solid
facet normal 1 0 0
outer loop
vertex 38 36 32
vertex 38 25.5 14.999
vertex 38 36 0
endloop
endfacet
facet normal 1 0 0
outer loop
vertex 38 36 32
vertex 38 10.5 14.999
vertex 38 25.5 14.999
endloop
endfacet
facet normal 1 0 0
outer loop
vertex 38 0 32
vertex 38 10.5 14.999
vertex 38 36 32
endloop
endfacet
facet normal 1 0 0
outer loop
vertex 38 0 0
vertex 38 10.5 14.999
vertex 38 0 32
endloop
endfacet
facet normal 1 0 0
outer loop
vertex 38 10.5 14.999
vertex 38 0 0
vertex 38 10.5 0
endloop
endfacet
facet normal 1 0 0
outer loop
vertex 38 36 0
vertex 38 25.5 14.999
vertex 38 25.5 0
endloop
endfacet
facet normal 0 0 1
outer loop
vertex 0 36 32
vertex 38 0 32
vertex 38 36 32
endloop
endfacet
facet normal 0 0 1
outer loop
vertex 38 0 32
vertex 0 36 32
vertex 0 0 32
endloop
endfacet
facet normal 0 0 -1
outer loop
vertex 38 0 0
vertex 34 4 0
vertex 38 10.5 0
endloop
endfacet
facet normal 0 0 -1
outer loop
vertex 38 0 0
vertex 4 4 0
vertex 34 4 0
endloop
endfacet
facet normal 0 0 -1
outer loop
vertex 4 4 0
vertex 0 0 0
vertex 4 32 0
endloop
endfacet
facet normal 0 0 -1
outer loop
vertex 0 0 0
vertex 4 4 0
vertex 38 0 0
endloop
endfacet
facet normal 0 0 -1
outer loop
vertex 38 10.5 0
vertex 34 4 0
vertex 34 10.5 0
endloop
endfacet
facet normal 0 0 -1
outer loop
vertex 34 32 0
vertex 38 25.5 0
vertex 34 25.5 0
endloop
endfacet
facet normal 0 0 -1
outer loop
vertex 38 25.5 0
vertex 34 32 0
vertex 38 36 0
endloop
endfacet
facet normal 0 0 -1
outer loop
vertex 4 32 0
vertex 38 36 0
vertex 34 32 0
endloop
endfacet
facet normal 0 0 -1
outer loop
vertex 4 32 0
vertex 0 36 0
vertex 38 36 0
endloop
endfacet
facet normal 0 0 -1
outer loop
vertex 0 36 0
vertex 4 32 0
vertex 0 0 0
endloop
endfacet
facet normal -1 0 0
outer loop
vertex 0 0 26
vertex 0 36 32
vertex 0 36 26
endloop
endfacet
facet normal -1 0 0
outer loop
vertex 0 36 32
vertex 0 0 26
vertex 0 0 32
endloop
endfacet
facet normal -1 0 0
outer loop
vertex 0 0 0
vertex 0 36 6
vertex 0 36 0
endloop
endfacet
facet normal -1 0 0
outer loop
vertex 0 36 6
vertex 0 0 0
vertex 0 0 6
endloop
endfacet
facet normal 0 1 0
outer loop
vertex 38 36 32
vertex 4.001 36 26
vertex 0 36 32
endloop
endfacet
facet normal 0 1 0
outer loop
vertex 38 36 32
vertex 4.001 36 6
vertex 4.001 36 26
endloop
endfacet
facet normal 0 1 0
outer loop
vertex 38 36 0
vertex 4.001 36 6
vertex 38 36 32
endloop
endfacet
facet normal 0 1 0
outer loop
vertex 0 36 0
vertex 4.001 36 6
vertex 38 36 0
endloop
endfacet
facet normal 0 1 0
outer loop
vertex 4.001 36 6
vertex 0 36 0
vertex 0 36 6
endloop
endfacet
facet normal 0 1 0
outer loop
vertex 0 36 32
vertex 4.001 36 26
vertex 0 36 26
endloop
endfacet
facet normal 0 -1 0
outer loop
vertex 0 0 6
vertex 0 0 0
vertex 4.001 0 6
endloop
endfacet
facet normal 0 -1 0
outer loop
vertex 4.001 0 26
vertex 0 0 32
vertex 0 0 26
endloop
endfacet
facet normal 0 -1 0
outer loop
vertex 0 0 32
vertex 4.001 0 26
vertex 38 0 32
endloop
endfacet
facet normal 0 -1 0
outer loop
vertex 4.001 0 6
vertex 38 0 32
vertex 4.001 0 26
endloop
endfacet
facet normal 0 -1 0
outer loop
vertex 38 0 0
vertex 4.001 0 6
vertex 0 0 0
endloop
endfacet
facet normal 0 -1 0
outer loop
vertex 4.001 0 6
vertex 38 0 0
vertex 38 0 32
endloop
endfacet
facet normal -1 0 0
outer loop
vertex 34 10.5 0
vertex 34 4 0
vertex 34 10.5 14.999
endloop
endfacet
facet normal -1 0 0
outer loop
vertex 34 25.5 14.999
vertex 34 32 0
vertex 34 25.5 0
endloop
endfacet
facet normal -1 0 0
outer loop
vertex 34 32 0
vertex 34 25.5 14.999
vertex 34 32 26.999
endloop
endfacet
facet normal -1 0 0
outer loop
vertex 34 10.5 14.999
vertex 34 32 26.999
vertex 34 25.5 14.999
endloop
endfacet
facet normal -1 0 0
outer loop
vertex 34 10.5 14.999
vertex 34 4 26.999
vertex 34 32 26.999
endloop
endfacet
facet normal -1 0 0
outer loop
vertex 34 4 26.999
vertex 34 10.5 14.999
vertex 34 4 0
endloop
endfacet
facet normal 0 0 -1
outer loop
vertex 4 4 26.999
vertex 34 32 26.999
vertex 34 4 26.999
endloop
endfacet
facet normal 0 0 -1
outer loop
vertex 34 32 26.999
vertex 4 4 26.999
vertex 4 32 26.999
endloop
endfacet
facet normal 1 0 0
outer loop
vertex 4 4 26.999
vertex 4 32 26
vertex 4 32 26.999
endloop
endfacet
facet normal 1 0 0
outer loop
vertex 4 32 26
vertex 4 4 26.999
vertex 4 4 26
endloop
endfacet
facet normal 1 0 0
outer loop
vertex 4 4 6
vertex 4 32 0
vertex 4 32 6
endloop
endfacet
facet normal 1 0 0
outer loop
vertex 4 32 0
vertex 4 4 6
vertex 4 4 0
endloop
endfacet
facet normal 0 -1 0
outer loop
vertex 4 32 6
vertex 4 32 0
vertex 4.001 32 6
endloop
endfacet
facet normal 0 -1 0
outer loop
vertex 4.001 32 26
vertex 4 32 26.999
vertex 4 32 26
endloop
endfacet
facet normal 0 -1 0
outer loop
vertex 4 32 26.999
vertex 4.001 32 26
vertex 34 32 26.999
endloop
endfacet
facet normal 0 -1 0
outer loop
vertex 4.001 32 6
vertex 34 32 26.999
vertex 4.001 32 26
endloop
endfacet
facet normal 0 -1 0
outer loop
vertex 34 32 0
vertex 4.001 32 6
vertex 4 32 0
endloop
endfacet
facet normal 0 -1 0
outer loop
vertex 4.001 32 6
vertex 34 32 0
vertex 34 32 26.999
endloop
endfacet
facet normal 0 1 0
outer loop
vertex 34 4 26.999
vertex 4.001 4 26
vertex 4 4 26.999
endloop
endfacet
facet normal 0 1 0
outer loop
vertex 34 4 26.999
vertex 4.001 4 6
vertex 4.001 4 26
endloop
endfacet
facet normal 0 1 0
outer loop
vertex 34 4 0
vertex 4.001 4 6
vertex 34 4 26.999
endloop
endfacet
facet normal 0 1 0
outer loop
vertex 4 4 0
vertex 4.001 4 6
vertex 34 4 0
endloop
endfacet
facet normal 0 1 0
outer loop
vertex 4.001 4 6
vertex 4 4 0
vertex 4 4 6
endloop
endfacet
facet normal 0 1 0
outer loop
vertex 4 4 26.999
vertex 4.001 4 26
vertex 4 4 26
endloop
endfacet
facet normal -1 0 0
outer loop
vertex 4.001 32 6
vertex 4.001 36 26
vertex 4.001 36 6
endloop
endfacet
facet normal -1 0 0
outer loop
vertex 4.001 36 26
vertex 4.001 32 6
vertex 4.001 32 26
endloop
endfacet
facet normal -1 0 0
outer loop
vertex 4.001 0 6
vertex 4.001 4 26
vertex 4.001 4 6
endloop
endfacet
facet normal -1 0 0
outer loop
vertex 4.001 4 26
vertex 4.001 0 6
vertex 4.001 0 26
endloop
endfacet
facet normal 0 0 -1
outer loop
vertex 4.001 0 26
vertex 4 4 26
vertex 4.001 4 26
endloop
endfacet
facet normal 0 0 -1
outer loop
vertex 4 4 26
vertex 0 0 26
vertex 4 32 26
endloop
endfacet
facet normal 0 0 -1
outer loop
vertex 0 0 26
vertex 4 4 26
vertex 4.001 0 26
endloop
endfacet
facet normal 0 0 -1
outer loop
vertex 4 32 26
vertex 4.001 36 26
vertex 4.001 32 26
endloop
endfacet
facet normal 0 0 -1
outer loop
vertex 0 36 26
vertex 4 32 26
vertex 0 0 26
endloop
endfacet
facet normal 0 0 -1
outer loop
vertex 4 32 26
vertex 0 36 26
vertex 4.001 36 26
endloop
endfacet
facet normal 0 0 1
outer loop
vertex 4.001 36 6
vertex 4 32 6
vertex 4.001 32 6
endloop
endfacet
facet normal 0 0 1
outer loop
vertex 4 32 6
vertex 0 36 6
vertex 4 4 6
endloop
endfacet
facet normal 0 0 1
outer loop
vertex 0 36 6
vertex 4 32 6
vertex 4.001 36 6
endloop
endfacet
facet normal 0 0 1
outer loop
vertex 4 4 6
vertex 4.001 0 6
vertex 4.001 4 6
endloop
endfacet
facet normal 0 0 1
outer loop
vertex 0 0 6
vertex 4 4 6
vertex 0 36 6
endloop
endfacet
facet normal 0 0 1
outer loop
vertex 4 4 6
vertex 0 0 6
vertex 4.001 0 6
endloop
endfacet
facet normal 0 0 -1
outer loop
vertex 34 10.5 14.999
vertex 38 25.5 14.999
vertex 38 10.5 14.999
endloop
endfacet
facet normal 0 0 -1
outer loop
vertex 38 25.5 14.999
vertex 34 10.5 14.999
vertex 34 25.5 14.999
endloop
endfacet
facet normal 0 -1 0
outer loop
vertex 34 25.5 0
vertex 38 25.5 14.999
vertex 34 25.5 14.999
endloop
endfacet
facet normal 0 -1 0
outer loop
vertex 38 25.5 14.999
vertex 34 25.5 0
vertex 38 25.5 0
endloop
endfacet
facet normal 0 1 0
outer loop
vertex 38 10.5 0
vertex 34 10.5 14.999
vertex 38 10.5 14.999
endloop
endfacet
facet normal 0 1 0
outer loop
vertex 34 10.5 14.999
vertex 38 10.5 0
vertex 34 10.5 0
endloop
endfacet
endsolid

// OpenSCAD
//
// ktRACK14
//

gap1 = 0.001;
gap2 = 0.002;
th = 4;

difference()
{
    union()
    {
        translate([0, 0, 0]) cube( [30+th*2, 28+th*2, 28+th*1]);
        
    }
    translate([th, th, -gap1]) cube( [30, 28, 27]);
    translate([-20+th+gap1, -gap1, (28+th*1)/2-20/2]) cube( [20, 28+th*2+gap2, 20]);
    translate([30+th-gap1, (28+th*2)/2-15/2, -gap1]) cube( [20, 15, 15]);
    
    #translate([((30+th*2)/10)*3, -3, 2-gap1]) rotate([0, 0, 0]) cylinder(  2+gap2, d1=2.5, d2=4.5, $fn=100);
    #translate([((30+th*2)/10)*3, -3, 2-gap1]) rotate([180, 0, 0]) cylinder(  10, d1=2.5, d2=2.5, $fn=100);
    #translate([((30+th*2)/10)*3, -3, 2+2-gap1]) rotate([0, 0, 0]) cylinder(  10, d1=6, d2=6, $fn=100);
    
    #translate([((30+th*2)/10)*8, -3, 2-gap1]) rotate([0, 0, 0]) cylinder(  2+gap2, d1=2.5, d2=4.5, $fn=100);
    #translate([((30+th*2)/10)*8, -3, 2-gap1]) rotate([180, 0, 0]) cylinder(  10, d1=2.5, d2=2.5, $fn=100);
    #translate([((30+th*2)/10)*8, -3, 2+2-gap1]) rotate([0, 0, 0]) cylinder(  10, d1=6, d2=6, $fn=100);
    
    #translate([((30+th*2)/10)*3, +3+28+th*2, 2-gap1]) rotate([0, 0, 0]) cylinder(  2+gap2, d1=2.5, d2=4.5, $fn=100);
    #translate([((30+th*2)/10)*3, +3+28+th*2, 2-gap1]) rotate([180, 0, 0]) cylinder(  10, d1=2.5, d2=2.5, $fn=100);
    #translate([((30+th*2)/10)*3, +3+28+th*2, 2+2-gap1]) rotate([0, 0, 0]) cylinder(  10, d1=6, d2=6, $fn=100);
    
    #translate([((30+th*2)/10)*8, +3+28+th*2, 2-gap1]) rotate([0, 0, 0]) cylinder(  2+gap2, d1=2.5, d2=4.5, $fn=100);
    #translate([((30+th*2)/10)*8, +3+28+th*2, 2-gap1]) rotate([180, 0, 0]) cylinder(  10, d1=2.5, d2=2.5, $fn=100);
    #translate([((30+th*2)/10)*8, +3+28+th*2, 2+2-gap1]) rotate([0, 0, 0]) cylinder(  10, d1=6, d2=6, $fn=100);
}
